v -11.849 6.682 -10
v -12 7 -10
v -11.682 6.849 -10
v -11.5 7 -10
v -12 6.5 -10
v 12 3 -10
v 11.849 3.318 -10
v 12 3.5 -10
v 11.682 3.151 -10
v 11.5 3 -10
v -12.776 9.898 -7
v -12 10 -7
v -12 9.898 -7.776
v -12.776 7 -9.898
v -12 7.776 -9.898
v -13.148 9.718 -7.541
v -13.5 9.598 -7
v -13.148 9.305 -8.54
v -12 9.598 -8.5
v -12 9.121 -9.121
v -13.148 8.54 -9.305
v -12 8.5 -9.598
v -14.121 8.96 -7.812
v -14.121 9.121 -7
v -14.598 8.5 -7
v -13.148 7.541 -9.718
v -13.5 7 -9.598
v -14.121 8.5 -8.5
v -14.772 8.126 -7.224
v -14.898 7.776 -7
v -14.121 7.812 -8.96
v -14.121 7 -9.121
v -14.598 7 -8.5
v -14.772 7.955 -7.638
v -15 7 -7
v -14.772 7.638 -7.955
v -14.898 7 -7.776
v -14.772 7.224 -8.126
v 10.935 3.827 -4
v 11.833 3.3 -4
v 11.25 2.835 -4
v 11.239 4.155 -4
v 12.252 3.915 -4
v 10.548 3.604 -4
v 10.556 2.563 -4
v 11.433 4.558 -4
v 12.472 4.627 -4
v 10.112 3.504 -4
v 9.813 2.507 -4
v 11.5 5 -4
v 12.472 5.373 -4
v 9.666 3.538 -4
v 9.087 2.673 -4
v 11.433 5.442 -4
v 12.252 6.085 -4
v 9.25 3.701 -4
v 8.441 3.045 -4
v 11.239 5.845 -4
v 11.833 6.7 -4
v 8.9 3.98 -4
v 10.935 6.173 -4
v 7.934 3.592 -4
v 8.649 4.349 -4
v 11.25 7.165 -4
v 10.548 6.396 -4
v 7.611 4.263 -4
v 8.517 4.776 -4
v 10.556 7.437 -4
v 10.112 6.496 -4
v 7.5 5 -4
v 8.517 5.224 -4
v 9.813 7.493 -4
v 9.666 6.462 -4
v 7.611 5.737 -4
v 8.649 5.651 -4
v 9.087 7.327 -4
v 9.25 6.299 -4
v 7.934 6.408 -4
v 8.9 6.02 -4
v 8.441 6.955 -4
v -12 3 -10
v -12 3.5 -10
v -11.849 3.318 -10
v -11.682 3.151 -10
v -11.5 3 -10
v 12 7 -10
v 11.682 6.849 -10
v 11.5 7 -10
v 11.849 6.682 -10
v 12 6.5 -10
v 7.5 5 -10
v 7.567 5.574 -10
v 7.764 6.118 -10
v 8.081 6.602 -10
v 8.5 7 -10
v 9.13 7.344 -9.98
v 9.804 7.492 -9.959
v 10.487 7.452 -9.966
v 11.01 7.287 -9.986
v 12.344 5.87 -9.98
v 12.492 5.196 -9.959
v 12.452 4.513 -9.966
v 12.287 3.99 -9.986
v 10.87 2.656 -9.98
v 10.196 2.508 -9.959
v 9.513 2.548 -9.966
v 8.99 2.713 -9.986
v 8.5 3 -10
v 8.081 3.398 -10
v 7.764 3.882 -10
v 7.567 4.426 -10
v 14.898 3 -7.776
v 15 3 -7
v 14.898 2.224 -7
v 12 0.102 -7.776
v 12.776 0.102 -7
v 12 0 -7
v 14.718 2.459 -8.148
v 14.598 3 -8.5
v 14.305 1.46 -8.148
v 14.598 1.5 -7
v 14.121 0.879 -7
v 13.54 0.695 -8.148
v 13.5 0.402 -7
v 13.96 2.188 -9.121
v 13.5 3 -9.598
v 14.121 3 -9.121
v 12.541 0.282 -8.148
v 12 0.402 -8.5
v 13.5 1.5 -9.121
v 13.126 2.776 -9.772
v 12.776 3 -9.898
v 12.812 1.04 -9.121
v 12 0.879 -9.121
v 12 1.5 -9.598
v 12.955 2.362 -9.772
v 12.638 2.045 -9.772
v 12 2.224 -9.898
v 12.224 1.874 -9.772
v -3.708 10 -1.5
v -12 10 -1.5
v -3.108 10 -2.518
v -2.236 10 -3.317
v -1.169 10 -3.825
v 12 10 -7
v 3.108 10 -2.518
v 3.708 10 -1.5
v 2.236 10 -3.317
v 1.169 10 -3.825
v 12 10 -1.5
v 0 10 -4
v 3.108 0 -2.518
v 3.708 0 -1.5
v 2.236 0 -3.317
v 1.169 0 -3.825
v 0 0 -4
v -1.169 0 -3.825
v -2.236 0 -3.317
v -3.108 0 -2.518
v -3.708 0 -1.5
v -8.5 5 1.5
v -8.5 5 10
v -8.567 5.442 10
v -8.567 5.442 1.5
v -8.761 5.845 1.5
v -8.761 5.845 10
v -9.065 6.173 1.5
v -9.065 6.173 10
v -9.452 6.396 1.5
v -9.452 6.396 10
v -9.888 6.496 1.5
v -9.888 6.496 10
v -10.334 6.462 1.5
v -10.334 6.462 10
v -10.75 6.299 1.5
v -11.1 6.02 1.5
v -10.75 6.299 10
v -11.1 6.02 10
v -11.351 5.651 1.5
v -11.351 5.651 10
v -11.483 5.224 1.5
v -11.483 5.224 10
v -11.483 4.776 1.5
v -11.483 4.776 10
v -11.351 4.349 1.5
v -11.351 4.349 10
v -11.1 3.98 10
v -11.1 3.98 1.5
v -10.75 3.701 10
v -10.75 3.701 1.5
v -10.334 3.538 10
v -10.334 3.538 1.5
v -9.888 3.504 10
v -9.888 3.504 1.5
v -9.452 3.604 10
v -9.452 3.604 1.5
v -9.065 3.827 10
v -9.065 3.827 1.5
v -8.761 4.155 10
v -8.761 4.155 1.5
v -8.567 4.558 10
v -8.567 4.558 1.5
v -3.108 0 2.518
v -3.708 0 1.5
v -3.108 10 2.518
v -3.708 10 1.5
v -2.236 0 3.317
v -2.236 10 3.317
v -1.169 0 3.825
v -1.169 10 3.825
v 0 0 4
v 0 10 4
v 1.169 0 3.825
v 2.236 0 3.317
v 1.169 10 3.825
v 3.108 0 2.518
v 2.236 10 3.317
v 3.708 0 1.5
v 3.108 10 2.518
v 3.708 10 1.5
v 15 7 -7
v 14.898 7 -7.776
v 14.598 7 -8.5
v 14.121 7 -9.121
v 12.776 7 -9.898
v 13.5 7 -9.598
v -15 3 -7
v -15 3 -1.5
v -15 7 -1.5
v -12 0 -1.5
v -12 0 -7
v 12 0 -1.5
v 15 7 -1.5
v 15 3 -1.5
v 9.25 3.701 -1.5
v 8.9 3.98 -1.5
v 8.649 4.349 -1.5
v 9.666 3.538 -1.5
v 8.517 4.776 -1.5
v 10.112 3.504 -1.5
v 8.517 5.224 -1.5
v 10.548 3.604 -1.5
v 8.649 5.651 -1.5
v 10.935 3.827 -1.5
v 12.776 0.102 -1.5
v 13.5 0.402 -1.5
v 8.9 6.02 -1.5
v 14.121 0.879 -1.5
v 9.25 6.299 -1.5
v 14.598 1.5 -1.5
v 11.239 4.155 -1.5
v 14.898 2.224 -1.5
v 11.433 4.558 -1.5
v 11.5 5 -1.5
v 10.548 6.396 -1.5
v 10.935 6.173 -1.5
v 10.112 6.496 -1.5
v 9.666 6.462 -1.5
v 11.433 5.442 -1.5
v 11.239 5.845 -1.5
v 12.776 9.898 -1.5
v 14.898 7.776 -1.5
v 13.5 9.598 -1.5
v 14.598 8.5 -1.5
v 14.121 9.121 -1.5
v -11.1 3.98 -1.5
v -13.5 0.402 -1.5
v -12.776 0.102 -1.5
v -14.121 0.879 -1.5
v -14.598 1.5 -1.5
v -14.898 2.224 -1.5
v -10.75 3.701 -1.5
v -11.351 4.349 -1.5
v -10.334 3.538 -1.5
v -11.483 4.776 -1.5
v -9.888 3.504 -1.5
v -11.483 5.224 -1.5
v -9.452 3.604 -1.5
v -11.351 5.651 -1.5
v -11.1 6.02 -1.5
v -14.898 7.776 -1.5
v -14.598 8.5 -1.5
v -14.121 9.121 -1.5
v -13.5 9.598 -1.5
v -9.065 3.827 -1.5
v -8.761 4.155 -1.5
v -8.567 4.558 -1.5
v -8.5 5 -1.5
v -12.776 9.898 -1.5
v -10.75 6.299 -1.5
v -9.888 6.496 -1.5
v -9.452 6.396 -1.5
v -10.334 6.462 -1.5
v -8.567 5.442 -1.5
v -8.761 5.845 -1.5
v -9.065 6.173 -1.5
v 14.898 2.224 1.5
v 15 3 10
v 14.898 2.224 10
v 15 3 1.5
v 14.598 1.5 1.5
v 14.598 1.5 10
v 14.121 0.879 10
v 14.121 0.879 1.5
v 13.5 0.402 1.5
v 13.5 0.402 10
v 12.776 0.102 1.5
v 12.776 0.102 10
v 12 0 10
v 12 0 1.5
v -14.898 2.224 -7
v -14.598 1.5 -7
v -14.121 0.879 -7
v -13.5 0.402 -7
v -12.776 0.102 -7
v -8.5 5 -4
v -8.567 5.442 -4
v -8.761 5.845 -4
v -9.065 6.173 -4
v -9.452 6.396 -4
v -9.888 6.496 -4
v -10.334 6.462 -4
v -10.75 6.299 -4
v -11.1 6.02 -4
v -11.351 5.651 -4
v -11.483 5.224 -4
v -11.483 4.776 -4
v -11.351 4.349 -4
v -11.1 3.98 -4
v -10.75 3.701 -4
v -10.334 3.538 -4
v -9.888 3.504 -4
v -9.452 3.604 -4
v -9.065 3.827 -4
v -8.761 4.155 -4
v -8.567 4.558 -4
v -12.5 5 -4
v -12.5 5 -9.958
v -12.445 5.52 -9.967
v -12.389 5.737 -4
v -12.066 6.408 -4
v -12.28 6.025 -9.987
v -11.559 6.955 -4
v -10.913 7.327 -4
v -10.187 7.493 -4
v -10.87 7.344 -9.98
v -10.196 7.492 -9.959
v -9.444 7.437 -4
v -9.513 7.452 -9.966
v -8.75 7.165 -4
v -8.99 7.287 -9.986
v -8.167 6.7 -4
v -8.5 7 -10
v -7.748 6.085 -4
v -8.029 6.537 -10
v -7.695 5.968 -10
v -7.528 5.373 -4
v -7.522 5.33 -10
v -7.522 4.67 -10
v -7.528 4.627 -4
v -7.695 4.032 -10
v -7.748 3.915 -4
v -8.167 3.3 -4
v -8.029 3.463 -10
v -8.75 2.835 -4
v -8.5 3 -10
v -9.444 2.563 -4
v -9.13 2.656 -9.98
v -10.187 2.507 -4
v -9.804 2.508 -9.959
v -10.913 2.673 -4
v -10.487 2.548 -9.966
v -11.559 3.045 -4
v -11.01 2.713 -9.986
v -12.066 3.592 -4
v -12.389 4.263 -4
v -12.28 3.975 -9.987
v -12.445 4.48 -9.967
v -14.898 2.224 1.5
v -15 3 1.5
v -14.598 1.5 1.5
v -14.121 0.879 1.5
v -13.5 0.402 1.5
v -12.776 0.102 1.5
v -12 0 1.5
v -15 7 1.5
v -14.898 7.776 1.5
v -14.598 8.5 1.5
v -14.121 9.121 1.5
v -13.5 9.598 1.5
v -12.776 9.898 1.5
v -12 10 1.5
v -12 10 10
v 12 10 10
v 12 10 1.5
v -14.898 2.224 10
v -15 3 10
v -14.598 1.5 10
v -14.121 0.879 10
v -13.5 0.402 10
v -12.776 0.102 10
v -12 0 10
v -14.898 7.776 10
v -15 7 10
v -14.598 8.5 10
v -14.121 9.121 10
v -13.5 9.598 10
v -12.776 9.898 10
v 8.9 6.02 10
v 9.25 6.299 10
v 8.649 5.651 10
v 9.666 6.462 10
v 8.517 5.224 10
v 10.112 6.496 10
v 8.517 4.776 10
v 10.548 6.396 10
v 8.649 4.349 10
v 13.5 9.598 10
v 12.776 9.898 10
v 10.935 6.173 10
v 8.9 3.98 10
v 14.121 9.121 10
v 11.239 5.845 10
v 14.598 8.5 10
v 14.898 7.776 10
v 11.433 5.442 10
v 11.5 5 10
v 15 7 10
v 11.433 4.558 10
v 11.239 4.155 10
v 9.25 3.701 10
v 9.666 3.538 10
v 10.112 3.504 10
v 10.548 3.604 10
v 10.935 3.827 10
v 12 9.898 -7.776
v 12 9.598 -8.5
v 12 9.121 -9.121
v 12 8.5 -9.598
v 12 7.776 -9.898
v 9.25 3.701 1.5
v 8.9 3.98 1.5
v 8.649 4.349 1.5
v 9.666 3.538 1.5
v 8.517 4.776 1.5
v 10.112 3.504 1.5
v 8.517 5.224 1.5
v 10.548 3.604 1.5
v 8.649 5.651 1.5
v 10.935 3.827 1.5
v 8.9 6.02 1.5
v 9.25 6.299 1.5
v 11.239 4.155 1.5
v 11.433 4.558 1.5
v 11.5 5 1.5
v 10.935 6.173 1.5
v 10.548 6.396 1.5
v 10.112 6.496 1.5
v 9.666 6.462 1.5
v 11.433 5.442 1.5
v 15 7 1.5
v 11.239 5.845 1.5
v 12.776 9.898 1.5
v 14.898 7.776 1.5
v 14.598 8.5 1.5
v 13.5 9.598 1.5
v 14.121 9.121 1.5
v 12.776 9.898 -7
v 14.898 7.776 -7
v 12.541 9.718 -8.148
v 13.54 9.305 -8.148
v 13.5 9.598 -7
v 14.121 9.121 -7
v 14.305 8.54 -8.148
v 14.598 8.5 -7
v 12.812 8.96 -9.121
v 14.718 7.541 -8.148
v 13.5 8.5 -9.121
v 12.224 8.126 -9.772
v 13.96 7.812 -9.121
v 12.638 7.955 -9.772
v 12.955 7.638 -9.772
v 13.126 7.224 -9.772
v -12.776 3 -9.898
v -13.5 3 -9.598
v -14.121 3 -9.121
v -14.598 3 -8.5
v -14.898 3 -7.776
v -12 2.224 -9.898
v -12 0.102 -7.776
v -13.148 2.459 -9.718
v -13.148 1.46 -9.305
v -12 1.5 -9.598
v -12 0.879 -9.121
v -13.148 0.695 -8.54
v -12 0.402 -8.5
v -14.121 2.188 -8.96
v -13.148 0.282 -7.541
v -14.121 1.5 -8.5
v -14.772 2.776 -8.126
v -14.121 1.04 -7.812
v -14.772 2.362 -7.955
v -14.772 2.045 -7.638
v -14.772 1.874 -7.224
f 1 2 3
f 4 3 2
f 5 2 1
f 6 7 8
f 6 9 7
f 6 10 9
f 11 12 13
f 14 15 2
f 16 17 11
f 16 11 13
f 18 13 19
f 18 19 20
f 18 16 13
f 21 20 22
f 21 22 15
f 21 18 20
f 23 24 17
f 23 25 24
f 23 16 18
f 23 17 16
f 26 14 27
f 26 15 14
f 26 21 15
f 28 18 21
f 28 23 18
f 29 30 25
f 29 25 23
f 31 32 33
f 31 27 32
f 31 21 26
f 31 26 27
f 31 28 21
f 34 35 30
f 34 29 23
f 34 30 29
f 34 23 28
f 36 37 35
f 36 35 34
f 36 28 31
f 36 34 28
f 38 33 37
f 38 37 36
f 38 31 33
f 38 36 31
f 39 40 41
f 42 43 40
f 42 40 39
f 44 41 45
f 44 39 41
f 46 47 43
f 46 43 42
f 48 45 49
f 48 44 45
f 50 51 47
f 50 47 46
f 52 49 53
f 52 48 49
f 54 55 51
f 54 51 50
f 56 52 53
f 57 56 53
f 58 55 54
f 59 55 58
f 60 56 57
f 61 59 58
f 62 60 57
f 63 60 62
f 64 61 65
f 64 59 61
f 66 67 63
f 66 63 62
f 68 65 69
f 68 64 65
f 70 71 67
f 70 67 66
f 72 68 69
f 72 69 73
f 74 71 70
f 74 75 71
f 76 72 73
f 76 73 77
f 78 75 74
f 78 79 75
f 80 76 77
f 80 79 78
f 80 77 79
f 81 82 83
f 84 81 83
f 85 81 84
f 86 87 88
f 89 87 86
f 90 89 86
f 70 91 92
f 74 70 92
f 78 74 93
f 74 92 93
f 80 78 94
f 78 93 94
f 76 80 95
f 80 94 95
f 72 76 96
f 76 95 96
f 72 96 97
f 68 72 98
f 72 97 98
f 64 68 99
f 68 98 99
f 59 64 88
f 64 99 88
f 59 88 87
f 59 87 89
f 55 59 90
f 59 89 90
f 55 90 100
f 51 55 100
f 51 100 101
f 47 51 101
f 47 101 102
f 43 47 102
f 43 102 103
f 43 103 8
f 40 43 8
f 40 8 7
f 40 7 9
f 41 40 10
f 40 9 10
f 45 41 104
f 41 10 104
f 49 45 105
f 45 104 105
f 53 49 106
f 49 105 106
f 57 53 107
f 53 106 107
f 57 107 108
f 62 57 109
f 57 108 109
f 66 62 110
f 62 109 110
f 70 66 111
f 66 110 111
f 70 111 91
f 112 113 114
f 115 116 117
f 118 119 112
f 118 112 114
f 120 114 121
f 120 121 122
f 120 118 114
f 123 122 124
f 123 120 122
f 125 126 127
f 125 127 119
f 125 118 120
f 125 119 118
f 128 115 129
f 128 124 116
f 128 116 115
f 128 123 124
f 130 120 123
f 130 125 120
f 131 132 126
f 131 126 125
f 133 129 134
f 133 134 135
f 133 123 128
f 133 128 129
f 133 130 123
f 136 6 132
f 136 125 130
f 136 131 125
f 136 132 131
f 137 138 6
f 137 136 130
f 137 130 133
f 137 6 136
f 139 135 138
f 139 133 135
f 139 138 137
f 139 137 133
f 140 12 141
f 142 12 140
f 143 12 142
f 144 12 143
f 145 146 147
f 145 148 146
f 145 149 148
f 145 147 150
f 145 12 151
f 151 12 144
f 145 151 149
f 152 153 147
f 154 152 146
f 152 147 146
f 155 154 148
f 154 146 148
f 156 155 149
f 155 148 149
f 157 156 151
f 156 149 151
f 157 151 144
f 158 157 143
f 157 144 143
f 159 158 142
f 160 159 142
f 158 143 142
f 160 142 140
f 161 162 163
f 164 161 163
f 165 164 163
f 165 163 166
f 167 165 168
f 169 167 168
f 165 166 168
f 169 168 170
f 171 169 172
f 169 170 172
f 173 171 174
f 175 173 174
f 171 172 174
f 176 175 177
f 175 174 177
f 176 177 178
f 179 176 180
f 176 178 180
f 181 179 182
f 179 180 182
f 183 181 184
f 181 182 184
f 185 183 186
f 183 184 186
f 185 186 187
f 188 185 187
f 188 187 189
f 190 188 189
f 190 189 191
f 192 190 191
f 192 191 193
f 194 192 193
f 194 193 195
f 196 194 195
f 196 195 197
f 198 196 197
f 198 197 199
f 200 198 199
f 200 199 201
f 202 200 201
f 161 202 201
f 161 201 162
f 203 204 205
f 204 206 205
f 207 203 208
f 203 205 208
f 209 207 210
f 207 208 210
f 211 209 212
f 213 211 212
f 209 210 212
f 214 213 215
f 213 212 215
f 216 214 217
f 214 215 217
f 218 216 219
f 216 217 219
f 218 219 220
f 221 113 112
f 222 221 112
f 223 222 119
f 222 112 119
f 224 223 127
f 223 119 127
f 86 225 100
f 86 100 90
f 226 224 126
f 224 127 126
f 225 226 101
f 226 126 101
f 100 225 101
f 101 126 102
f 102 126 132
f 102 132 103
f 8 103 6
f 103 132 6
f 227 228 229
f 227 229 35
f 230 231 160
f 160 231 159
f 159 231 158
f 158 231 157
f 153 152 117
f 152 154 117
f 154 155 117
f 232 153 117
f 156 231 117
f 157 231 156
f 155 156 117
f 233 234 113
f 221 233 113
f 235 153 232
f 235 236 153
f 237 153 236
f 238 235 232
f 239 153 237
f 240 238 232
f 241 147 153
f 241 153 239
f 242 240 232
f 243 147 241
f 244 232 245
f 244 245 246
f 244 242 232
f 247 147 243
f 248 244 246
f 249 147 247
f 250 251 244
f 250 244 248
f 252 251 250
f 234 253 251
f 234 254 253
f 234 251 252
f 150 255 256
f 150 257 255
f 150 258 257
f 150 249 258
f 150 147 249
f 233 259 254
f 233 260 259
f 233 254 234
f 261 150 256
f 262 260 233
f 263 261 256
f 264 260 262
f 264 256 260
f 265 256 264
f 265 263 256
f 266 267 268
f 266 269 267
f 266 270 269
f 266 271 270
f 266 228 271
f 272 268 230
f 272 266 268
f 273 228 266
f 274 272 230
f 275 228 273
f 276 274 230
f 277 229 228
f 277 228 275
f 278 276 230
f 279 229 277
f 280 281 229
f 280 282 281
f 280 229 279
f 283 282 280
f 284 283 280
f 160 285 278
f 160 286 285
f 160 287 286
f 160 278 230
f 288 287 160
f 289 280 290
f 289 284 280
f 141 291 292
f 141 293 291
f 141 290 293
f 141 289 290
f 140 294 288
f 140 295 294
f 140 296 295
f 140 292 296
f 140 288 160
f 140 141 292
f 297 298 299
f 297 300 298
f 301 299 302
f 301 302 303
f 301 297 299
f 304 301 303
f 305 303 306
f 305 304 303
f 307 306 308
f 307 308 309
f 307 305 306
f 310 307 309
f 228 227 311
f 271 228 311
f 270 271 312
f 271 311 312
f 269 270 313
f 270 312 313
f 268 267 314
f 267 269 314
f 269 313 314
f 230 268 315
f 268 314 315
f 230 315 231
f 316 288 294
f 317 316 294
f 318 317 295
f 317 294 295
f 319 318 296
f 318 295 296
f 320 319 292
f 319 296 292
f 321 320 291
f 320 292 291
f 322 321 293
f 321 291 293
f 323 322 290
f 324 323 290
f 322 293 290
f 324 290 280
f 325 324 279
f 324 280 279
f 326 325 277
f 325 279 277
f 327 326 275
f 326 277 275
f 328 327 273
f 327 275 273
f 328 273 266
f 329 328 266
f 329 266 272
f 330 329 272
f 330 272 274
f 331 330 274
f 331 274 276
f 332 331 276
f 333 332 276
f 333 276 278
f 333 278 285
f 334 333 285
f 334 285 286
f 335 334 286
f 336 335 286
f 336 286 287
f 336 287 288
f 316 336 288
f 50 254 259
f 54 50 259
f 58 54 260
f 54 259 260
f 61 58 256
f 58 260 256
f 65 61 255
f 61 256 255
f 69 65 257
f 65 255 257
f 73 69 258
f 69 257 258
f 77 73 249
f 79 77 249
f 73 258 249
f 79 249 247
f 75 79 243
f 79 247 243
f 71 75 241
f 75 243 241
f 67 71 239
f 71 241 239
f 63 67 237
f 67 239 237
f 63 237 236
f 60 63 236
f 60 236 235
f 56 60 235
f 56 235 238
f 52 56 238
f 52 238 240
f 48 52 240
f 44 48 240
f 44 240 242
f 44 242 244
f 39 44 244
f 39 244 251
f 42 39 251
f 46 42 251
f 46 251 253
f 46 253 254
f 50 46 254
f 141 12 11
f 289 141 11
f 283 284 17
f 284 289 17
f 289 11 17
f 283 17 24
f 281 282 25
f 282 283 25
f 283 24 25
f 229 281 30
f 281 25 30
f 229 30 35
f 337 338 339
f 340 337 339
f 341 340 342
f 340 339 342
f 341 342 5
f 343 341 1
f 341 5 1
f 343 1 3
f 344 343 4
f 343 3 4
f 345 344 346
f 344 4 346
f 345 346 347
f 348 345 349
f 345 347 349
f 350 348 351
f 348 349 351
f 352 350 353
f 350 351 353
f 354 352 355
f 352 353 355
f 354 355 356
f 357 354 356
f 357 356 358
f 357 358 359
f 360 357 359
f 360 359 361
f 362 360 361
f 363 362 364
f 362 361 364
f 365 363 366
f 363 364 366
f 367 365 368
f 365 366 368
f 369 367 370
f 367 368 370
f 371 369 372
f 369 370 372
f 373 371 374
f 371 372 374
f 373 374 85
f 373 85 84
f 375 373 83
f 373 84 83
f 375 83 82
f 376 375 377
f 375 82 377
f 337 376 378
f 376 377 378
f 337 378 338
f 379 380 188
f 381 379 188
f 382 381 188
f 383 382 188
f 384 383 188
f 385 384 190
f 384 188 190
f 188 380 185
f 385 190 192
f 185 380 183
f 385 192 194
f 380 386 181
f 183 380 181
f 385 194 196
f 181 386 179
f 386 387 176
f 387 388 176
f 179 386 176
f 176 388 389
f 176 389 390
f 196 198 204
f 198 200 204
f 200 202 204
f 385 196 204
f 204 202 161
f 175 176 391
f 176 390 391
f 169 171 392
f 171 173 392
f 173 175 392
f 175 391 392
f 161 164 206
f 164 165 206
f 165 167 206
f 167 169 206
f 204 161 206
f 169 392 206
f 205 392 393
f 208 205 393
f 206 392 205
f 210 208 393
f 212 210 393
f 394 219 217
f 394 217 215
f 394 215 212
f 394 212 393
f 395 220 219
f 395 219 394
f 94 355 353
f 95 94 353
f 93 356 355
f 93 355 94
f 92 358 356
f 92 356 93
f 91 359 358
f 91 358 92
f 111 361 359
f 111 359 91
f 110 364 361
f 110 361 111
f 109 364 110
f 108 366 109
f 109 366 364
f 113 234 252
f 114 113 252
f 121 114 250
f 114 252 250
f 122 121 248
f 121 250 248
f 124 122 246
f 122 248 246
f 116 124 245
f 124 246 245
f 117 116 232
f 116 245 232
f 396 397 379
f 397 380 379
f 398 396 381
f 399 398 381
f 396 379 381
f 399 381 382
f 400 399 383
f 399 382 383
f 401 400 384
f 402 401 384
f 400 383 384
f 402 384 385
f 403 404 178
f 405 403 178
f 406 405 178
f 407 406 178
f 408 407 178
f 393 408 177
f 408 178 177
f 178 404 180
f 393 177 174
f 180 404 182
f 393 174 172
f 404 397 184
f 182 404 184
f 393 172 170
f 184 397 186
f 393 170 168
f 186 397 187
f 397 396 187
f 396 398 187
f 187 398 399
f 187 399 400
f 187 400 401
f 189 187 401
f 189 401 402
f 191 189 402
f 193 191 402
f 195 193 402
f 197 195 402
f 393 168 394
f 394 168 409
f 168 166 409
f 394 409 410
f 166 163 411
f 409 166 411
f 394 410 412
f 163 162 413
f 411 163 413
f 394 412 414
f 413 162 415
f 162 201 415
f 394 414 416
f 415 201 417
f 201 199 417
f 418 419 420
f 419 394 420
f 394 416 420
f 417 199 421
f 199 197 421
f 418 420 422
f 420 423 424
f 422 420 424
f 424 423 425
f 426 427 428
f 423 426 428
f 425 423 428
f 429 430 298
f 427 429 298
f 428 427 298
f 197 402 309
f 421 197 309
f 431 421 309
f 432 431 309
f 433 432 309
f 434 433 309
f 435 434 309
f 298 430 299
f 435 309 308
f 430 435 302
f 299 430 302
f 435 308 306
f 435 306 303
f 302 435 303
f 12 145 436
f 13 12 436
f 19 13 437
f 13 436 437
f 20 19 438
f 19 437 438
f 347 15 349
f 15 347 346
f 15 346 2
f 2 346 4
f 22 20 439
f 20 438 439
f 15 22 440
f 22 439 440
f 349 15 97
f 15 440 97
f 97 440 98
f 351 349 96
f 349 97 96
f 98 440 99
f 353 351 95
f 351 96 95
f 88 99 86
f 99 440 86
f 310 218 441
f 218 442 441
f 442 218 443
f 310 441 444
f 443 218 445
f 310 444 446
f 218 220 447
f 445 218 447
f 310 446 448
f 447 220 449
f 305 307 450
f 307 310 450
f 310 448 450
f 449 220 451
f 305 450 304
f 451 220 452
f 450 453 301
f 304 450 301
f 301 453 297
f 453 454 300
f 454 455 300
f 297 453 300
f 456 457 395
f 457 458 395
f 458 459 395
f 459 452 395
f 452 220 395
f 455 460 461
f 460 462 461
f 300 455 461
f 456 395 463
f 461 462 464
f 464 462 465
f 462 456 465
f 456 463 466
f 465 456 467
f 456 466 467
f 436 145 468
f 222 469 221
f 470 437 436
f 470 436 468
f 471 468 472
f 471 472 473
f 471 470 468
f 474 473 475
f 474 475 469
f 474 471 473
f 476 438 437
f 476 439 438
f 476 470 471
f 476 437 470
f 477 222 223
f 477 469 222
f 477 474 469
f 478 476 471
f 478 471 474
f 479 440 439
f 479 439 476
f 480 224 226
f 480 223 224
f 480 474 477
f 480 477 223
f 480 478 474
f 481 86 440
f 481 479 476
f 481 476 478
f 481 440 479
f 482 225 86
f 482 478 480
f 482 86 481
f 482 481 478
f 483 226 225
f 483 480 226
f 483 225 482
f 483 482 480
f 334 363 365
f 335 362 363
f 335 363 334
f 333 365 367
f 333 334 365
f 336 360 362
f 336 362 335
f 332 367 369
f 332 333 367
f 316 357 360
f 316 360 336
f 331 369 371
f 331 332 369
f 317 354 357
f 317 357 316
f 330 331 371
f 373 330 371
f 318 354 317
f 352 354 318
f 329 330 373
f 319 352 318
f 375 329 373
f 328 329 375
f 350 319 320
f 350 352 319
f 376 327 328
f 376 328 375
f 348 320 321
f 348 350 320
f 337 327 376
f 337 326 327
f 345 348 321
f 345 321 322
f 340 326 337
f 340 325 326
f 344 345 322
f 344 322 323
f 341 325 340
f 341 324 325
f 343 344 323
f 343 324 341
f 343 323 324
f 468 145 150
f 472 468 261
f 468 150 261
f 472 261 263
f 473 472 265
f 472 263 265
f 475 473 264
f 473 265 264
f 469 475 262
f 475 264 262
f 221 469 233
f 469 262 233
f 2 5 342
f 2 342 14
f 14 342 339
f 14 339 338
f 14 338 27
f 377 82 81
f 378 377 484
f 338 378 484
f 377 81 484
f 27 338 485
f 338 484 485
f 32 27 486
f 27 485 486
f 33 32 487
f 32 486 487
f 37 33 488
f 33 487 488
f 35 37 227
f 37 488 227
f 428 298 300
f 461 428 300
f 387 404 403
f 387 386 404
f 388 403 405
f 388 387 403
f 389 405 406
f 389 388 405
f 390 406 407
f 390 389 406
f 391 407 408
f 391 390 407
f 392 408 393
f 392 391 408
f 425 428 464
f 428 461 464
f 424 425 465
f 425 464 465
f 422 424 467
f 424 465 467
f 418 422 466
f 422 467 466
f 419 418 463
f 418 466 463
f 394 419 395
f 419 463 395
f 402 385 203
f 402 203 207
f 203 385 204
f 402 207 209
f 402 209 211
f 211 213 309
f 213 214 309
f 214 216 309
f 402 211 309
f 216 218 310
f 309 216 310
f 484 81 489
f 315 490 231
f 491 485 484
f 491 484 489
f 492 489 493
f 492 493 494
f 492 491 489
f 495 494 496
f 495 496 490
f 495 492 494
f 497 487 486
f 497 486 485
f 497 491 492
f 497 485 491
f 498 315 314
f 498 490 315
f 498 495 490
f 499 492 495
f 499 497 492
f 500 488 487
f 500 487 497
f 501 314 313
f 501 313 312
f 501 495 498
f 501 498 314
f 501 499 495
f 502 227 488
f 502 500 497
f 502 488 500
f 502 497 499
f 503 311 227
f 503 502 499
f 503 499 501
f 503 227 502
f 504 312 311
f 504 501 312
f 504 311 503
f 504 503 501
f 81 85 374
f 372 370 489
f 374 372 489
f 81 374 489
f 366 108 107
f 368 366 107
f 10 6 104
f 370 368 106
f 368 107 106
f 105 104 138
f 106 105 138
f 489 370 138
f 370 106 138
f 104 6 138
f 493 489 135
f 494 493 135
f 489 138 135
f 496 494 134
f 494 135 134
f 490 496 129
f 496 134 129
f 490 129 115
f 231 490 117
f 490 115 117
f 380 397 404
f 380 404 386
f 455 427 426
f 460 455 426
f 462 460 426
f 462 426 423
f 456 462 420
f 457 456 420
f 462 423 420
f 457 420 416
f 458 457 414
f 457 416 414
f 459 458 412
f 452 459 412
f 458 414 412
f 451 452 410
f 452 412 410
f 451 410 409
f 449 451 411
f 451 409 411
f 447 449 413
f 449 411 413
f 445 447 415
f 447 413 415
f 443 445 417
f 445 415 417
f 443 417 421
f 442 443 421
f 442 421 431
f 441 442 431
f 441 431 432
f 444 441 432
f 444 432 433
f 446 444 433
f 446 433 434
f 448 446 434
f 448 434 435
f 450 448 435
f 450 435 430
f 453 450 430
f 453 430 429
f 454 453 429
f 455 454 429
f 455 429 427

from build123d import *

# Parameters (mm, degrees)
SKETCH1_W           = 30
SKETCH1_H           = 20
BOSS_EXTRUDE1_DEPTH = 10
SKETCH2_R           = 4
CUT_EXTRUDE1_DEPTH  = 10
SKETCH3_R           = 1.5
CUT_EXTRUDE2_DEPTH  = 27.925824036
SKETCH4_R           = 2.5
CUT_EXTRUDE3_DEPTH  = 6
SKETCH5_W           = 30
SKETCH5_H           = 3
CUT_EXTRUDE4_DEPTH  = 21.615528128
FILLET2_R           = 3
FILLET3_R           = 3


with BuildPart() as part:
    # Sketch1 → Boss-Extrude1 (new body)
    with BuildSketch(Plane(origin=(0, 0, 0), x_dir=(1, 0, 0), z_dir=(0, 1, 0))):
        Rectangle(SKETCH1_W, SKETCH1_H)
    extrude(amount=BOSS_EXTRUDE1_DEPTH)

    # Sketch2 → Cut-Extrude1 (cut)
    with BuildSketch(Plane(origin=(0, 10, 0), x_dir=(1, 0, 0), z_dir=(0, 1, 0))):
        with Locations(Location((0, 0, 0), (0, 0, 270))):
            Circle(SKETCH2_R)
    extrude(amount=-CUT_EXTRUDE1_DEPTH, mode=Mode.SUBTRACT)

    # Sketch3 → Cut-Extrude2 (cut, through all)
    with BuildSketch(Plane.XY.offset(10)):
        with Locations((-10, 5)):
            Circle(SKETCH3_R)
        with Locations((10, 5)):
            Circle(SKETCH3_R)
    extrude(amount=-CUT_EXTRUDE2_DEPTH, mode=Mode.SUBTRACT)

    # Sketch4 → Cut-Extrude3 (cut)
    with BuildSketch(Plane(origin=(0, 0, -10), x_dir=(-1, 0, 0), z_dir=(0, 0, -1))):
        with Locations((-10, 5)):
            Circle(SKETCH4_R)
        with Locations((10, 5)):
            Circle(SKETCH4_R)
    extrude(amount=-CUT_EXTRUDE3_DEPTH, mode=Mode.SUBTRACT)

    # Sketch5 → Cut-Extrude4 (cut, through all)
    with BuildSketch(Plane(origin=(0, 10, 0), x_dir=(1, 0, 0), z_dir=(0, 1, 0))):
        Rectangle(SKETCH5_W, SKETCH5_H)
    extrude(amount=-CUT_EXTRUDE4_DEPTH, mode=Mode.SUBTRACT)


with BuildPart() as cut_extrude4_piece_1:
    # of the separate pieces the step leaves, piece 1, a body of its own (cut_extrude4_pieces)
    add(part.part.solids().sort_by_distance((-15, 0, 10))[0])

    # Fillet3
    fillet3_edges = [cut_extrude4_piece_1.edges().sort_by_distance(p)[0] for p in [
        (15, 10, 5.75),
        (-15, 0, 5.75),
        (-15, 10, 5.75),
        (15, 0, 5.75),
    ]]
    fillet(fillet3_edges, radius=FILLET3_R)


with BuildPart() as cut_extrude4_piece_2:
    # of the separate pieces the step leaves, piece 2, a body of its own (cut_extrude4_pieces)
    add(part.part.solids().sort_by_distance((-15, 0, -10))[0])

    # Fillet2
    # the kernel refuses this fillet: 3 mm, written as the material it takes off along each edge
    with BuildSketch(Plane(origin=(12, 3, -7), x_dir=(1, 0, 0), z_dir=(0, 0, -1))) as fillet2_piece_1_section:
        Polygon((0, 0), (FILLET2_R, 0), (FILLET2_R, FILLET2_R), (0, FILLET2_R), align=None)
    fillet2_piece_1 = extrude(amount=FILLET2_R, mode=Mode.PRIVATE)
    fillet2_piece_1 = fillet2_piece_1 - Plane(origin=(12, 3, -7), x_dir=(-0.7071067811865475, 0.7071067811865475, 0), z_dir=(0, 0, -1)) * Sphere(FILLET2_R, mode=Mode.PRIVATE)
    add(fillet2_piece_1, mode=Mode.SUBTRACT)
    with BuildSketch(Plane(origin=(-12, 3, -7), x_dir=(0, 0, -1), z_dir=(-1, 0, 0))) as fillet2_piece_2_section:
        Polygon((0, 0), (FILLET2_R, 0), (FILLET2_R, FILLET2_R), (0, FILLET2_R), align=None)
    fillet2_piece_2 = extrude(amount=FILLET2_R, mode=Mode.PRIVATE)
    fillet2_piece_2 = fillet2_piece_2 - Plane(origin=(-12, 3, -7), x_dir=(0, 0.7071067811865475, 0.7071067811865475), z_dir=(-1, 0, 0)) * Sphere(FILLET2_R, mode=Mode.PRIVATE)
    add(fillet2_piece_2, mode=Mode.SUBTRACT)
    with BuildSketch(Plane(origin=(-12, 7, -7), x_dir=(0, 0, -1), z_dir=(-1, 0, 0))) as fillet2_piece_3_section:
        Polygon((0, 0), (FILLET2_R, 0), (FILLET2_R, -FILLET2_R), (0, -FILLET2_R), align=None)
    fillet2_piece_3 = extrude(amount=FILLET2_R, mode=Mode.PRIVATE)
    fillet2_piece_3 = fillet2_piece_3 - Plane(origin=(-12, 7, -7), x_dir=(0, -0.7071067811865475, 0.7071067811865475), z_dir=(-1, 0, 0)) * Sphere(FILLET2_R, mode=Mode.PRIVATE)
    add(fillet2_piece_3, mode=Mode.SUBTRACT)
    with BuildSketch(Plane(origin=(12, 7, -7), x_dir=(1, 0, 0), z_dir=(0, 0, -1))) as fillet2_piece_4_section:
        Polygon((0, 0), (FILLET2_R, 0), (FILLET2_R, -FILLET2_R), (0, -FILLET2_R), align=None)
    fillet2_piece_4 = extrude(amount=FILLET2_R, mode=Mode.PRIVATE)
    fillet2_piece_4 = fillet2_piece_4 - Plane(origin=(12, 7, -7), x_dir=(-0.7071067811865475, -0.7071067811865475, 0), z_dir=(0, 0, -1)) * Sphere(FILLET2_R, mode=Mode.PRIVATE)
    add(fillet2_piece_4, mode=Mode.SUBTRACT)
    with BuildSketch(Plane(origin=(15, 0, 6), x_dir=(0, 1, 0), z_dir=(0, 0, -1)), Plane(origin=(-15, 0, -7), x_dir=(0, 1, 0), z_dir=(0, 0, 1))) as fillet2_piece_5:
        with BuildLine():
            CenterArc((FILLET2_R, -FILLET2_R), FILLET2_R, 90, 90)
            Line((0, -FILLET2_R), (0, 0))
            Line((0, 0), (FILLET2_R, 0))
        make_face()
    extrude(amount=13, mode=Mode.SUBTRACT)
    with BuildSketch(Plane(origin=(-15, 3, -10), x_dir=(0, 0, 1), z_dir=(0, 1, 0)), Plane(origin=(15, 3, -10), x_dir=(-1, 0, 0), z_dir=(0, 1, 0))) as fillet2_piece_6:
        with BuildLine():
            CenterArc((FILLET2_R, FILLET2_R), FILLET2_R, 180, 90)
            Line((0, FILLET2_R), (0, 0))
            Line((0, 0), (FILLET2_R, 0))
        make_face()
    extrude(amount=4, mode=Mode.SUBTRACT)
    with BuildSketch(Plane(origin=(-15, 10, -7), x_dir=(0, -1, 0), z_dir=(0, 0, 1)), Plane(origin=(15, 10, 6), x_dir=(0, -1, 0), z_dir=(0, 0, -1))) as fillet2_piece_7:
        with BuildLine():
            CenterArc((FILLET2_R, FILLET2_R), FILLET2_R, 180, 90)
            Line((0, FILLET2_R), (0, 0))
            Line((0, 0), (FILLET2_R, 0))
        make_face()
    extrude(amount=13, mode=Mode.SUBTRACT)
    with BuildSketch(Plane(origin=(12, 10, -10), x_dir=(0, -1, 0), z_dir=(-1, 0, 0))) as fillet2_piece_8:
        with BuildLine():
            CenterArc((FILLET2_R, FILLET2_R), FILLET2_R, 180, 90)
            Line((0, FILLET2_R), (0, 0))
            Line((0, 0), (FILLET2_R, 0))
        make_face()
    extrude(amount=24, mode=Mode.SUBTRACT)
    with BuildSketch(Plane(origin=(12, 0, -10), x_dir=(0, 1, 0), z_dir=(-1, 0, 0))) as fillet2_piece_9:
        with BuildLine():
            CenterArc((FILLET2_R, -FILLET2_R), FILLET2_R, 90, 90)
            Line((0, -FILLET2_R), (0, 0))
            Line((0, 0), (FILLET2_R, 0))
        make_face()
    extrude(amount=24, mode=Mode.SUBTRACT)


solid = Compound([cut_extrude4_piece_1.part, cut_extrude4_piece_2.part])
